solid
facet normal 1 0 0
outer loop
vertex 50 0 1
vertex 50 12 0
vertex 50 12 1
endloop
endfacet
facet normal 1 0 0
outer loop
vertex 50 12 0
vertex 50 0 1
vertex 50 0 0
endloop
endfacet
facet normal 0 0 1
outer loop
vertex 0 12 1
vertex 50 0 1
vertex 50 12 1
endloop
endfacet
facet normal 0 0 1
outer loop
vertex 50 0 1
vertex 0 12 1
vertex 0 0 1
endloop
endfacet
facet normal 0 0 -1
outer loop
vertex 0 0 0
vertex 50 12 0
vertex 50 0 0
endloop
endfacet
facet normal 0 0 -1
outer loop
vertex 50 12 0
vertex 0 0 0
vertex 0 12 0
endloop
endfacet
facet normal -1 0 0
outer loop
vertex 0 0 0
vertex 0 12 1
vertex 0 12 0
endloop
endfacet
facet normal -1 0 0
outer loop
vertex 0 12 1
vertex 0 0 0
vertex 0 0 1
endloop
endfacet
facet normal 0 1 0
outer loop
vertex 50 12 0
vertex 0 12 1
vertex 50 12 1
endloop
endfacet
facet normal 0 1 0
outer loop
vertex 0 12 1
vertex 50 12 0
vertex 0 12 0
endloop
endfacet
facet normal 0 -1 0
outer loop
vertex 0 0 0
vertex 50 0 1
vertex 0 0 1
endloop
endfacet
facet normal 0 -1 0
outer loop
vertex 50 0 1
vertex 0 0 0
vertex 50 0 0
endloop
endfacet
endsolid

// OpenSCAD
difference() {
	cube(size = [50, 12, 1]);
	translate(v = [1, 1, 1]) {
		text(text = "John");
	}
}
